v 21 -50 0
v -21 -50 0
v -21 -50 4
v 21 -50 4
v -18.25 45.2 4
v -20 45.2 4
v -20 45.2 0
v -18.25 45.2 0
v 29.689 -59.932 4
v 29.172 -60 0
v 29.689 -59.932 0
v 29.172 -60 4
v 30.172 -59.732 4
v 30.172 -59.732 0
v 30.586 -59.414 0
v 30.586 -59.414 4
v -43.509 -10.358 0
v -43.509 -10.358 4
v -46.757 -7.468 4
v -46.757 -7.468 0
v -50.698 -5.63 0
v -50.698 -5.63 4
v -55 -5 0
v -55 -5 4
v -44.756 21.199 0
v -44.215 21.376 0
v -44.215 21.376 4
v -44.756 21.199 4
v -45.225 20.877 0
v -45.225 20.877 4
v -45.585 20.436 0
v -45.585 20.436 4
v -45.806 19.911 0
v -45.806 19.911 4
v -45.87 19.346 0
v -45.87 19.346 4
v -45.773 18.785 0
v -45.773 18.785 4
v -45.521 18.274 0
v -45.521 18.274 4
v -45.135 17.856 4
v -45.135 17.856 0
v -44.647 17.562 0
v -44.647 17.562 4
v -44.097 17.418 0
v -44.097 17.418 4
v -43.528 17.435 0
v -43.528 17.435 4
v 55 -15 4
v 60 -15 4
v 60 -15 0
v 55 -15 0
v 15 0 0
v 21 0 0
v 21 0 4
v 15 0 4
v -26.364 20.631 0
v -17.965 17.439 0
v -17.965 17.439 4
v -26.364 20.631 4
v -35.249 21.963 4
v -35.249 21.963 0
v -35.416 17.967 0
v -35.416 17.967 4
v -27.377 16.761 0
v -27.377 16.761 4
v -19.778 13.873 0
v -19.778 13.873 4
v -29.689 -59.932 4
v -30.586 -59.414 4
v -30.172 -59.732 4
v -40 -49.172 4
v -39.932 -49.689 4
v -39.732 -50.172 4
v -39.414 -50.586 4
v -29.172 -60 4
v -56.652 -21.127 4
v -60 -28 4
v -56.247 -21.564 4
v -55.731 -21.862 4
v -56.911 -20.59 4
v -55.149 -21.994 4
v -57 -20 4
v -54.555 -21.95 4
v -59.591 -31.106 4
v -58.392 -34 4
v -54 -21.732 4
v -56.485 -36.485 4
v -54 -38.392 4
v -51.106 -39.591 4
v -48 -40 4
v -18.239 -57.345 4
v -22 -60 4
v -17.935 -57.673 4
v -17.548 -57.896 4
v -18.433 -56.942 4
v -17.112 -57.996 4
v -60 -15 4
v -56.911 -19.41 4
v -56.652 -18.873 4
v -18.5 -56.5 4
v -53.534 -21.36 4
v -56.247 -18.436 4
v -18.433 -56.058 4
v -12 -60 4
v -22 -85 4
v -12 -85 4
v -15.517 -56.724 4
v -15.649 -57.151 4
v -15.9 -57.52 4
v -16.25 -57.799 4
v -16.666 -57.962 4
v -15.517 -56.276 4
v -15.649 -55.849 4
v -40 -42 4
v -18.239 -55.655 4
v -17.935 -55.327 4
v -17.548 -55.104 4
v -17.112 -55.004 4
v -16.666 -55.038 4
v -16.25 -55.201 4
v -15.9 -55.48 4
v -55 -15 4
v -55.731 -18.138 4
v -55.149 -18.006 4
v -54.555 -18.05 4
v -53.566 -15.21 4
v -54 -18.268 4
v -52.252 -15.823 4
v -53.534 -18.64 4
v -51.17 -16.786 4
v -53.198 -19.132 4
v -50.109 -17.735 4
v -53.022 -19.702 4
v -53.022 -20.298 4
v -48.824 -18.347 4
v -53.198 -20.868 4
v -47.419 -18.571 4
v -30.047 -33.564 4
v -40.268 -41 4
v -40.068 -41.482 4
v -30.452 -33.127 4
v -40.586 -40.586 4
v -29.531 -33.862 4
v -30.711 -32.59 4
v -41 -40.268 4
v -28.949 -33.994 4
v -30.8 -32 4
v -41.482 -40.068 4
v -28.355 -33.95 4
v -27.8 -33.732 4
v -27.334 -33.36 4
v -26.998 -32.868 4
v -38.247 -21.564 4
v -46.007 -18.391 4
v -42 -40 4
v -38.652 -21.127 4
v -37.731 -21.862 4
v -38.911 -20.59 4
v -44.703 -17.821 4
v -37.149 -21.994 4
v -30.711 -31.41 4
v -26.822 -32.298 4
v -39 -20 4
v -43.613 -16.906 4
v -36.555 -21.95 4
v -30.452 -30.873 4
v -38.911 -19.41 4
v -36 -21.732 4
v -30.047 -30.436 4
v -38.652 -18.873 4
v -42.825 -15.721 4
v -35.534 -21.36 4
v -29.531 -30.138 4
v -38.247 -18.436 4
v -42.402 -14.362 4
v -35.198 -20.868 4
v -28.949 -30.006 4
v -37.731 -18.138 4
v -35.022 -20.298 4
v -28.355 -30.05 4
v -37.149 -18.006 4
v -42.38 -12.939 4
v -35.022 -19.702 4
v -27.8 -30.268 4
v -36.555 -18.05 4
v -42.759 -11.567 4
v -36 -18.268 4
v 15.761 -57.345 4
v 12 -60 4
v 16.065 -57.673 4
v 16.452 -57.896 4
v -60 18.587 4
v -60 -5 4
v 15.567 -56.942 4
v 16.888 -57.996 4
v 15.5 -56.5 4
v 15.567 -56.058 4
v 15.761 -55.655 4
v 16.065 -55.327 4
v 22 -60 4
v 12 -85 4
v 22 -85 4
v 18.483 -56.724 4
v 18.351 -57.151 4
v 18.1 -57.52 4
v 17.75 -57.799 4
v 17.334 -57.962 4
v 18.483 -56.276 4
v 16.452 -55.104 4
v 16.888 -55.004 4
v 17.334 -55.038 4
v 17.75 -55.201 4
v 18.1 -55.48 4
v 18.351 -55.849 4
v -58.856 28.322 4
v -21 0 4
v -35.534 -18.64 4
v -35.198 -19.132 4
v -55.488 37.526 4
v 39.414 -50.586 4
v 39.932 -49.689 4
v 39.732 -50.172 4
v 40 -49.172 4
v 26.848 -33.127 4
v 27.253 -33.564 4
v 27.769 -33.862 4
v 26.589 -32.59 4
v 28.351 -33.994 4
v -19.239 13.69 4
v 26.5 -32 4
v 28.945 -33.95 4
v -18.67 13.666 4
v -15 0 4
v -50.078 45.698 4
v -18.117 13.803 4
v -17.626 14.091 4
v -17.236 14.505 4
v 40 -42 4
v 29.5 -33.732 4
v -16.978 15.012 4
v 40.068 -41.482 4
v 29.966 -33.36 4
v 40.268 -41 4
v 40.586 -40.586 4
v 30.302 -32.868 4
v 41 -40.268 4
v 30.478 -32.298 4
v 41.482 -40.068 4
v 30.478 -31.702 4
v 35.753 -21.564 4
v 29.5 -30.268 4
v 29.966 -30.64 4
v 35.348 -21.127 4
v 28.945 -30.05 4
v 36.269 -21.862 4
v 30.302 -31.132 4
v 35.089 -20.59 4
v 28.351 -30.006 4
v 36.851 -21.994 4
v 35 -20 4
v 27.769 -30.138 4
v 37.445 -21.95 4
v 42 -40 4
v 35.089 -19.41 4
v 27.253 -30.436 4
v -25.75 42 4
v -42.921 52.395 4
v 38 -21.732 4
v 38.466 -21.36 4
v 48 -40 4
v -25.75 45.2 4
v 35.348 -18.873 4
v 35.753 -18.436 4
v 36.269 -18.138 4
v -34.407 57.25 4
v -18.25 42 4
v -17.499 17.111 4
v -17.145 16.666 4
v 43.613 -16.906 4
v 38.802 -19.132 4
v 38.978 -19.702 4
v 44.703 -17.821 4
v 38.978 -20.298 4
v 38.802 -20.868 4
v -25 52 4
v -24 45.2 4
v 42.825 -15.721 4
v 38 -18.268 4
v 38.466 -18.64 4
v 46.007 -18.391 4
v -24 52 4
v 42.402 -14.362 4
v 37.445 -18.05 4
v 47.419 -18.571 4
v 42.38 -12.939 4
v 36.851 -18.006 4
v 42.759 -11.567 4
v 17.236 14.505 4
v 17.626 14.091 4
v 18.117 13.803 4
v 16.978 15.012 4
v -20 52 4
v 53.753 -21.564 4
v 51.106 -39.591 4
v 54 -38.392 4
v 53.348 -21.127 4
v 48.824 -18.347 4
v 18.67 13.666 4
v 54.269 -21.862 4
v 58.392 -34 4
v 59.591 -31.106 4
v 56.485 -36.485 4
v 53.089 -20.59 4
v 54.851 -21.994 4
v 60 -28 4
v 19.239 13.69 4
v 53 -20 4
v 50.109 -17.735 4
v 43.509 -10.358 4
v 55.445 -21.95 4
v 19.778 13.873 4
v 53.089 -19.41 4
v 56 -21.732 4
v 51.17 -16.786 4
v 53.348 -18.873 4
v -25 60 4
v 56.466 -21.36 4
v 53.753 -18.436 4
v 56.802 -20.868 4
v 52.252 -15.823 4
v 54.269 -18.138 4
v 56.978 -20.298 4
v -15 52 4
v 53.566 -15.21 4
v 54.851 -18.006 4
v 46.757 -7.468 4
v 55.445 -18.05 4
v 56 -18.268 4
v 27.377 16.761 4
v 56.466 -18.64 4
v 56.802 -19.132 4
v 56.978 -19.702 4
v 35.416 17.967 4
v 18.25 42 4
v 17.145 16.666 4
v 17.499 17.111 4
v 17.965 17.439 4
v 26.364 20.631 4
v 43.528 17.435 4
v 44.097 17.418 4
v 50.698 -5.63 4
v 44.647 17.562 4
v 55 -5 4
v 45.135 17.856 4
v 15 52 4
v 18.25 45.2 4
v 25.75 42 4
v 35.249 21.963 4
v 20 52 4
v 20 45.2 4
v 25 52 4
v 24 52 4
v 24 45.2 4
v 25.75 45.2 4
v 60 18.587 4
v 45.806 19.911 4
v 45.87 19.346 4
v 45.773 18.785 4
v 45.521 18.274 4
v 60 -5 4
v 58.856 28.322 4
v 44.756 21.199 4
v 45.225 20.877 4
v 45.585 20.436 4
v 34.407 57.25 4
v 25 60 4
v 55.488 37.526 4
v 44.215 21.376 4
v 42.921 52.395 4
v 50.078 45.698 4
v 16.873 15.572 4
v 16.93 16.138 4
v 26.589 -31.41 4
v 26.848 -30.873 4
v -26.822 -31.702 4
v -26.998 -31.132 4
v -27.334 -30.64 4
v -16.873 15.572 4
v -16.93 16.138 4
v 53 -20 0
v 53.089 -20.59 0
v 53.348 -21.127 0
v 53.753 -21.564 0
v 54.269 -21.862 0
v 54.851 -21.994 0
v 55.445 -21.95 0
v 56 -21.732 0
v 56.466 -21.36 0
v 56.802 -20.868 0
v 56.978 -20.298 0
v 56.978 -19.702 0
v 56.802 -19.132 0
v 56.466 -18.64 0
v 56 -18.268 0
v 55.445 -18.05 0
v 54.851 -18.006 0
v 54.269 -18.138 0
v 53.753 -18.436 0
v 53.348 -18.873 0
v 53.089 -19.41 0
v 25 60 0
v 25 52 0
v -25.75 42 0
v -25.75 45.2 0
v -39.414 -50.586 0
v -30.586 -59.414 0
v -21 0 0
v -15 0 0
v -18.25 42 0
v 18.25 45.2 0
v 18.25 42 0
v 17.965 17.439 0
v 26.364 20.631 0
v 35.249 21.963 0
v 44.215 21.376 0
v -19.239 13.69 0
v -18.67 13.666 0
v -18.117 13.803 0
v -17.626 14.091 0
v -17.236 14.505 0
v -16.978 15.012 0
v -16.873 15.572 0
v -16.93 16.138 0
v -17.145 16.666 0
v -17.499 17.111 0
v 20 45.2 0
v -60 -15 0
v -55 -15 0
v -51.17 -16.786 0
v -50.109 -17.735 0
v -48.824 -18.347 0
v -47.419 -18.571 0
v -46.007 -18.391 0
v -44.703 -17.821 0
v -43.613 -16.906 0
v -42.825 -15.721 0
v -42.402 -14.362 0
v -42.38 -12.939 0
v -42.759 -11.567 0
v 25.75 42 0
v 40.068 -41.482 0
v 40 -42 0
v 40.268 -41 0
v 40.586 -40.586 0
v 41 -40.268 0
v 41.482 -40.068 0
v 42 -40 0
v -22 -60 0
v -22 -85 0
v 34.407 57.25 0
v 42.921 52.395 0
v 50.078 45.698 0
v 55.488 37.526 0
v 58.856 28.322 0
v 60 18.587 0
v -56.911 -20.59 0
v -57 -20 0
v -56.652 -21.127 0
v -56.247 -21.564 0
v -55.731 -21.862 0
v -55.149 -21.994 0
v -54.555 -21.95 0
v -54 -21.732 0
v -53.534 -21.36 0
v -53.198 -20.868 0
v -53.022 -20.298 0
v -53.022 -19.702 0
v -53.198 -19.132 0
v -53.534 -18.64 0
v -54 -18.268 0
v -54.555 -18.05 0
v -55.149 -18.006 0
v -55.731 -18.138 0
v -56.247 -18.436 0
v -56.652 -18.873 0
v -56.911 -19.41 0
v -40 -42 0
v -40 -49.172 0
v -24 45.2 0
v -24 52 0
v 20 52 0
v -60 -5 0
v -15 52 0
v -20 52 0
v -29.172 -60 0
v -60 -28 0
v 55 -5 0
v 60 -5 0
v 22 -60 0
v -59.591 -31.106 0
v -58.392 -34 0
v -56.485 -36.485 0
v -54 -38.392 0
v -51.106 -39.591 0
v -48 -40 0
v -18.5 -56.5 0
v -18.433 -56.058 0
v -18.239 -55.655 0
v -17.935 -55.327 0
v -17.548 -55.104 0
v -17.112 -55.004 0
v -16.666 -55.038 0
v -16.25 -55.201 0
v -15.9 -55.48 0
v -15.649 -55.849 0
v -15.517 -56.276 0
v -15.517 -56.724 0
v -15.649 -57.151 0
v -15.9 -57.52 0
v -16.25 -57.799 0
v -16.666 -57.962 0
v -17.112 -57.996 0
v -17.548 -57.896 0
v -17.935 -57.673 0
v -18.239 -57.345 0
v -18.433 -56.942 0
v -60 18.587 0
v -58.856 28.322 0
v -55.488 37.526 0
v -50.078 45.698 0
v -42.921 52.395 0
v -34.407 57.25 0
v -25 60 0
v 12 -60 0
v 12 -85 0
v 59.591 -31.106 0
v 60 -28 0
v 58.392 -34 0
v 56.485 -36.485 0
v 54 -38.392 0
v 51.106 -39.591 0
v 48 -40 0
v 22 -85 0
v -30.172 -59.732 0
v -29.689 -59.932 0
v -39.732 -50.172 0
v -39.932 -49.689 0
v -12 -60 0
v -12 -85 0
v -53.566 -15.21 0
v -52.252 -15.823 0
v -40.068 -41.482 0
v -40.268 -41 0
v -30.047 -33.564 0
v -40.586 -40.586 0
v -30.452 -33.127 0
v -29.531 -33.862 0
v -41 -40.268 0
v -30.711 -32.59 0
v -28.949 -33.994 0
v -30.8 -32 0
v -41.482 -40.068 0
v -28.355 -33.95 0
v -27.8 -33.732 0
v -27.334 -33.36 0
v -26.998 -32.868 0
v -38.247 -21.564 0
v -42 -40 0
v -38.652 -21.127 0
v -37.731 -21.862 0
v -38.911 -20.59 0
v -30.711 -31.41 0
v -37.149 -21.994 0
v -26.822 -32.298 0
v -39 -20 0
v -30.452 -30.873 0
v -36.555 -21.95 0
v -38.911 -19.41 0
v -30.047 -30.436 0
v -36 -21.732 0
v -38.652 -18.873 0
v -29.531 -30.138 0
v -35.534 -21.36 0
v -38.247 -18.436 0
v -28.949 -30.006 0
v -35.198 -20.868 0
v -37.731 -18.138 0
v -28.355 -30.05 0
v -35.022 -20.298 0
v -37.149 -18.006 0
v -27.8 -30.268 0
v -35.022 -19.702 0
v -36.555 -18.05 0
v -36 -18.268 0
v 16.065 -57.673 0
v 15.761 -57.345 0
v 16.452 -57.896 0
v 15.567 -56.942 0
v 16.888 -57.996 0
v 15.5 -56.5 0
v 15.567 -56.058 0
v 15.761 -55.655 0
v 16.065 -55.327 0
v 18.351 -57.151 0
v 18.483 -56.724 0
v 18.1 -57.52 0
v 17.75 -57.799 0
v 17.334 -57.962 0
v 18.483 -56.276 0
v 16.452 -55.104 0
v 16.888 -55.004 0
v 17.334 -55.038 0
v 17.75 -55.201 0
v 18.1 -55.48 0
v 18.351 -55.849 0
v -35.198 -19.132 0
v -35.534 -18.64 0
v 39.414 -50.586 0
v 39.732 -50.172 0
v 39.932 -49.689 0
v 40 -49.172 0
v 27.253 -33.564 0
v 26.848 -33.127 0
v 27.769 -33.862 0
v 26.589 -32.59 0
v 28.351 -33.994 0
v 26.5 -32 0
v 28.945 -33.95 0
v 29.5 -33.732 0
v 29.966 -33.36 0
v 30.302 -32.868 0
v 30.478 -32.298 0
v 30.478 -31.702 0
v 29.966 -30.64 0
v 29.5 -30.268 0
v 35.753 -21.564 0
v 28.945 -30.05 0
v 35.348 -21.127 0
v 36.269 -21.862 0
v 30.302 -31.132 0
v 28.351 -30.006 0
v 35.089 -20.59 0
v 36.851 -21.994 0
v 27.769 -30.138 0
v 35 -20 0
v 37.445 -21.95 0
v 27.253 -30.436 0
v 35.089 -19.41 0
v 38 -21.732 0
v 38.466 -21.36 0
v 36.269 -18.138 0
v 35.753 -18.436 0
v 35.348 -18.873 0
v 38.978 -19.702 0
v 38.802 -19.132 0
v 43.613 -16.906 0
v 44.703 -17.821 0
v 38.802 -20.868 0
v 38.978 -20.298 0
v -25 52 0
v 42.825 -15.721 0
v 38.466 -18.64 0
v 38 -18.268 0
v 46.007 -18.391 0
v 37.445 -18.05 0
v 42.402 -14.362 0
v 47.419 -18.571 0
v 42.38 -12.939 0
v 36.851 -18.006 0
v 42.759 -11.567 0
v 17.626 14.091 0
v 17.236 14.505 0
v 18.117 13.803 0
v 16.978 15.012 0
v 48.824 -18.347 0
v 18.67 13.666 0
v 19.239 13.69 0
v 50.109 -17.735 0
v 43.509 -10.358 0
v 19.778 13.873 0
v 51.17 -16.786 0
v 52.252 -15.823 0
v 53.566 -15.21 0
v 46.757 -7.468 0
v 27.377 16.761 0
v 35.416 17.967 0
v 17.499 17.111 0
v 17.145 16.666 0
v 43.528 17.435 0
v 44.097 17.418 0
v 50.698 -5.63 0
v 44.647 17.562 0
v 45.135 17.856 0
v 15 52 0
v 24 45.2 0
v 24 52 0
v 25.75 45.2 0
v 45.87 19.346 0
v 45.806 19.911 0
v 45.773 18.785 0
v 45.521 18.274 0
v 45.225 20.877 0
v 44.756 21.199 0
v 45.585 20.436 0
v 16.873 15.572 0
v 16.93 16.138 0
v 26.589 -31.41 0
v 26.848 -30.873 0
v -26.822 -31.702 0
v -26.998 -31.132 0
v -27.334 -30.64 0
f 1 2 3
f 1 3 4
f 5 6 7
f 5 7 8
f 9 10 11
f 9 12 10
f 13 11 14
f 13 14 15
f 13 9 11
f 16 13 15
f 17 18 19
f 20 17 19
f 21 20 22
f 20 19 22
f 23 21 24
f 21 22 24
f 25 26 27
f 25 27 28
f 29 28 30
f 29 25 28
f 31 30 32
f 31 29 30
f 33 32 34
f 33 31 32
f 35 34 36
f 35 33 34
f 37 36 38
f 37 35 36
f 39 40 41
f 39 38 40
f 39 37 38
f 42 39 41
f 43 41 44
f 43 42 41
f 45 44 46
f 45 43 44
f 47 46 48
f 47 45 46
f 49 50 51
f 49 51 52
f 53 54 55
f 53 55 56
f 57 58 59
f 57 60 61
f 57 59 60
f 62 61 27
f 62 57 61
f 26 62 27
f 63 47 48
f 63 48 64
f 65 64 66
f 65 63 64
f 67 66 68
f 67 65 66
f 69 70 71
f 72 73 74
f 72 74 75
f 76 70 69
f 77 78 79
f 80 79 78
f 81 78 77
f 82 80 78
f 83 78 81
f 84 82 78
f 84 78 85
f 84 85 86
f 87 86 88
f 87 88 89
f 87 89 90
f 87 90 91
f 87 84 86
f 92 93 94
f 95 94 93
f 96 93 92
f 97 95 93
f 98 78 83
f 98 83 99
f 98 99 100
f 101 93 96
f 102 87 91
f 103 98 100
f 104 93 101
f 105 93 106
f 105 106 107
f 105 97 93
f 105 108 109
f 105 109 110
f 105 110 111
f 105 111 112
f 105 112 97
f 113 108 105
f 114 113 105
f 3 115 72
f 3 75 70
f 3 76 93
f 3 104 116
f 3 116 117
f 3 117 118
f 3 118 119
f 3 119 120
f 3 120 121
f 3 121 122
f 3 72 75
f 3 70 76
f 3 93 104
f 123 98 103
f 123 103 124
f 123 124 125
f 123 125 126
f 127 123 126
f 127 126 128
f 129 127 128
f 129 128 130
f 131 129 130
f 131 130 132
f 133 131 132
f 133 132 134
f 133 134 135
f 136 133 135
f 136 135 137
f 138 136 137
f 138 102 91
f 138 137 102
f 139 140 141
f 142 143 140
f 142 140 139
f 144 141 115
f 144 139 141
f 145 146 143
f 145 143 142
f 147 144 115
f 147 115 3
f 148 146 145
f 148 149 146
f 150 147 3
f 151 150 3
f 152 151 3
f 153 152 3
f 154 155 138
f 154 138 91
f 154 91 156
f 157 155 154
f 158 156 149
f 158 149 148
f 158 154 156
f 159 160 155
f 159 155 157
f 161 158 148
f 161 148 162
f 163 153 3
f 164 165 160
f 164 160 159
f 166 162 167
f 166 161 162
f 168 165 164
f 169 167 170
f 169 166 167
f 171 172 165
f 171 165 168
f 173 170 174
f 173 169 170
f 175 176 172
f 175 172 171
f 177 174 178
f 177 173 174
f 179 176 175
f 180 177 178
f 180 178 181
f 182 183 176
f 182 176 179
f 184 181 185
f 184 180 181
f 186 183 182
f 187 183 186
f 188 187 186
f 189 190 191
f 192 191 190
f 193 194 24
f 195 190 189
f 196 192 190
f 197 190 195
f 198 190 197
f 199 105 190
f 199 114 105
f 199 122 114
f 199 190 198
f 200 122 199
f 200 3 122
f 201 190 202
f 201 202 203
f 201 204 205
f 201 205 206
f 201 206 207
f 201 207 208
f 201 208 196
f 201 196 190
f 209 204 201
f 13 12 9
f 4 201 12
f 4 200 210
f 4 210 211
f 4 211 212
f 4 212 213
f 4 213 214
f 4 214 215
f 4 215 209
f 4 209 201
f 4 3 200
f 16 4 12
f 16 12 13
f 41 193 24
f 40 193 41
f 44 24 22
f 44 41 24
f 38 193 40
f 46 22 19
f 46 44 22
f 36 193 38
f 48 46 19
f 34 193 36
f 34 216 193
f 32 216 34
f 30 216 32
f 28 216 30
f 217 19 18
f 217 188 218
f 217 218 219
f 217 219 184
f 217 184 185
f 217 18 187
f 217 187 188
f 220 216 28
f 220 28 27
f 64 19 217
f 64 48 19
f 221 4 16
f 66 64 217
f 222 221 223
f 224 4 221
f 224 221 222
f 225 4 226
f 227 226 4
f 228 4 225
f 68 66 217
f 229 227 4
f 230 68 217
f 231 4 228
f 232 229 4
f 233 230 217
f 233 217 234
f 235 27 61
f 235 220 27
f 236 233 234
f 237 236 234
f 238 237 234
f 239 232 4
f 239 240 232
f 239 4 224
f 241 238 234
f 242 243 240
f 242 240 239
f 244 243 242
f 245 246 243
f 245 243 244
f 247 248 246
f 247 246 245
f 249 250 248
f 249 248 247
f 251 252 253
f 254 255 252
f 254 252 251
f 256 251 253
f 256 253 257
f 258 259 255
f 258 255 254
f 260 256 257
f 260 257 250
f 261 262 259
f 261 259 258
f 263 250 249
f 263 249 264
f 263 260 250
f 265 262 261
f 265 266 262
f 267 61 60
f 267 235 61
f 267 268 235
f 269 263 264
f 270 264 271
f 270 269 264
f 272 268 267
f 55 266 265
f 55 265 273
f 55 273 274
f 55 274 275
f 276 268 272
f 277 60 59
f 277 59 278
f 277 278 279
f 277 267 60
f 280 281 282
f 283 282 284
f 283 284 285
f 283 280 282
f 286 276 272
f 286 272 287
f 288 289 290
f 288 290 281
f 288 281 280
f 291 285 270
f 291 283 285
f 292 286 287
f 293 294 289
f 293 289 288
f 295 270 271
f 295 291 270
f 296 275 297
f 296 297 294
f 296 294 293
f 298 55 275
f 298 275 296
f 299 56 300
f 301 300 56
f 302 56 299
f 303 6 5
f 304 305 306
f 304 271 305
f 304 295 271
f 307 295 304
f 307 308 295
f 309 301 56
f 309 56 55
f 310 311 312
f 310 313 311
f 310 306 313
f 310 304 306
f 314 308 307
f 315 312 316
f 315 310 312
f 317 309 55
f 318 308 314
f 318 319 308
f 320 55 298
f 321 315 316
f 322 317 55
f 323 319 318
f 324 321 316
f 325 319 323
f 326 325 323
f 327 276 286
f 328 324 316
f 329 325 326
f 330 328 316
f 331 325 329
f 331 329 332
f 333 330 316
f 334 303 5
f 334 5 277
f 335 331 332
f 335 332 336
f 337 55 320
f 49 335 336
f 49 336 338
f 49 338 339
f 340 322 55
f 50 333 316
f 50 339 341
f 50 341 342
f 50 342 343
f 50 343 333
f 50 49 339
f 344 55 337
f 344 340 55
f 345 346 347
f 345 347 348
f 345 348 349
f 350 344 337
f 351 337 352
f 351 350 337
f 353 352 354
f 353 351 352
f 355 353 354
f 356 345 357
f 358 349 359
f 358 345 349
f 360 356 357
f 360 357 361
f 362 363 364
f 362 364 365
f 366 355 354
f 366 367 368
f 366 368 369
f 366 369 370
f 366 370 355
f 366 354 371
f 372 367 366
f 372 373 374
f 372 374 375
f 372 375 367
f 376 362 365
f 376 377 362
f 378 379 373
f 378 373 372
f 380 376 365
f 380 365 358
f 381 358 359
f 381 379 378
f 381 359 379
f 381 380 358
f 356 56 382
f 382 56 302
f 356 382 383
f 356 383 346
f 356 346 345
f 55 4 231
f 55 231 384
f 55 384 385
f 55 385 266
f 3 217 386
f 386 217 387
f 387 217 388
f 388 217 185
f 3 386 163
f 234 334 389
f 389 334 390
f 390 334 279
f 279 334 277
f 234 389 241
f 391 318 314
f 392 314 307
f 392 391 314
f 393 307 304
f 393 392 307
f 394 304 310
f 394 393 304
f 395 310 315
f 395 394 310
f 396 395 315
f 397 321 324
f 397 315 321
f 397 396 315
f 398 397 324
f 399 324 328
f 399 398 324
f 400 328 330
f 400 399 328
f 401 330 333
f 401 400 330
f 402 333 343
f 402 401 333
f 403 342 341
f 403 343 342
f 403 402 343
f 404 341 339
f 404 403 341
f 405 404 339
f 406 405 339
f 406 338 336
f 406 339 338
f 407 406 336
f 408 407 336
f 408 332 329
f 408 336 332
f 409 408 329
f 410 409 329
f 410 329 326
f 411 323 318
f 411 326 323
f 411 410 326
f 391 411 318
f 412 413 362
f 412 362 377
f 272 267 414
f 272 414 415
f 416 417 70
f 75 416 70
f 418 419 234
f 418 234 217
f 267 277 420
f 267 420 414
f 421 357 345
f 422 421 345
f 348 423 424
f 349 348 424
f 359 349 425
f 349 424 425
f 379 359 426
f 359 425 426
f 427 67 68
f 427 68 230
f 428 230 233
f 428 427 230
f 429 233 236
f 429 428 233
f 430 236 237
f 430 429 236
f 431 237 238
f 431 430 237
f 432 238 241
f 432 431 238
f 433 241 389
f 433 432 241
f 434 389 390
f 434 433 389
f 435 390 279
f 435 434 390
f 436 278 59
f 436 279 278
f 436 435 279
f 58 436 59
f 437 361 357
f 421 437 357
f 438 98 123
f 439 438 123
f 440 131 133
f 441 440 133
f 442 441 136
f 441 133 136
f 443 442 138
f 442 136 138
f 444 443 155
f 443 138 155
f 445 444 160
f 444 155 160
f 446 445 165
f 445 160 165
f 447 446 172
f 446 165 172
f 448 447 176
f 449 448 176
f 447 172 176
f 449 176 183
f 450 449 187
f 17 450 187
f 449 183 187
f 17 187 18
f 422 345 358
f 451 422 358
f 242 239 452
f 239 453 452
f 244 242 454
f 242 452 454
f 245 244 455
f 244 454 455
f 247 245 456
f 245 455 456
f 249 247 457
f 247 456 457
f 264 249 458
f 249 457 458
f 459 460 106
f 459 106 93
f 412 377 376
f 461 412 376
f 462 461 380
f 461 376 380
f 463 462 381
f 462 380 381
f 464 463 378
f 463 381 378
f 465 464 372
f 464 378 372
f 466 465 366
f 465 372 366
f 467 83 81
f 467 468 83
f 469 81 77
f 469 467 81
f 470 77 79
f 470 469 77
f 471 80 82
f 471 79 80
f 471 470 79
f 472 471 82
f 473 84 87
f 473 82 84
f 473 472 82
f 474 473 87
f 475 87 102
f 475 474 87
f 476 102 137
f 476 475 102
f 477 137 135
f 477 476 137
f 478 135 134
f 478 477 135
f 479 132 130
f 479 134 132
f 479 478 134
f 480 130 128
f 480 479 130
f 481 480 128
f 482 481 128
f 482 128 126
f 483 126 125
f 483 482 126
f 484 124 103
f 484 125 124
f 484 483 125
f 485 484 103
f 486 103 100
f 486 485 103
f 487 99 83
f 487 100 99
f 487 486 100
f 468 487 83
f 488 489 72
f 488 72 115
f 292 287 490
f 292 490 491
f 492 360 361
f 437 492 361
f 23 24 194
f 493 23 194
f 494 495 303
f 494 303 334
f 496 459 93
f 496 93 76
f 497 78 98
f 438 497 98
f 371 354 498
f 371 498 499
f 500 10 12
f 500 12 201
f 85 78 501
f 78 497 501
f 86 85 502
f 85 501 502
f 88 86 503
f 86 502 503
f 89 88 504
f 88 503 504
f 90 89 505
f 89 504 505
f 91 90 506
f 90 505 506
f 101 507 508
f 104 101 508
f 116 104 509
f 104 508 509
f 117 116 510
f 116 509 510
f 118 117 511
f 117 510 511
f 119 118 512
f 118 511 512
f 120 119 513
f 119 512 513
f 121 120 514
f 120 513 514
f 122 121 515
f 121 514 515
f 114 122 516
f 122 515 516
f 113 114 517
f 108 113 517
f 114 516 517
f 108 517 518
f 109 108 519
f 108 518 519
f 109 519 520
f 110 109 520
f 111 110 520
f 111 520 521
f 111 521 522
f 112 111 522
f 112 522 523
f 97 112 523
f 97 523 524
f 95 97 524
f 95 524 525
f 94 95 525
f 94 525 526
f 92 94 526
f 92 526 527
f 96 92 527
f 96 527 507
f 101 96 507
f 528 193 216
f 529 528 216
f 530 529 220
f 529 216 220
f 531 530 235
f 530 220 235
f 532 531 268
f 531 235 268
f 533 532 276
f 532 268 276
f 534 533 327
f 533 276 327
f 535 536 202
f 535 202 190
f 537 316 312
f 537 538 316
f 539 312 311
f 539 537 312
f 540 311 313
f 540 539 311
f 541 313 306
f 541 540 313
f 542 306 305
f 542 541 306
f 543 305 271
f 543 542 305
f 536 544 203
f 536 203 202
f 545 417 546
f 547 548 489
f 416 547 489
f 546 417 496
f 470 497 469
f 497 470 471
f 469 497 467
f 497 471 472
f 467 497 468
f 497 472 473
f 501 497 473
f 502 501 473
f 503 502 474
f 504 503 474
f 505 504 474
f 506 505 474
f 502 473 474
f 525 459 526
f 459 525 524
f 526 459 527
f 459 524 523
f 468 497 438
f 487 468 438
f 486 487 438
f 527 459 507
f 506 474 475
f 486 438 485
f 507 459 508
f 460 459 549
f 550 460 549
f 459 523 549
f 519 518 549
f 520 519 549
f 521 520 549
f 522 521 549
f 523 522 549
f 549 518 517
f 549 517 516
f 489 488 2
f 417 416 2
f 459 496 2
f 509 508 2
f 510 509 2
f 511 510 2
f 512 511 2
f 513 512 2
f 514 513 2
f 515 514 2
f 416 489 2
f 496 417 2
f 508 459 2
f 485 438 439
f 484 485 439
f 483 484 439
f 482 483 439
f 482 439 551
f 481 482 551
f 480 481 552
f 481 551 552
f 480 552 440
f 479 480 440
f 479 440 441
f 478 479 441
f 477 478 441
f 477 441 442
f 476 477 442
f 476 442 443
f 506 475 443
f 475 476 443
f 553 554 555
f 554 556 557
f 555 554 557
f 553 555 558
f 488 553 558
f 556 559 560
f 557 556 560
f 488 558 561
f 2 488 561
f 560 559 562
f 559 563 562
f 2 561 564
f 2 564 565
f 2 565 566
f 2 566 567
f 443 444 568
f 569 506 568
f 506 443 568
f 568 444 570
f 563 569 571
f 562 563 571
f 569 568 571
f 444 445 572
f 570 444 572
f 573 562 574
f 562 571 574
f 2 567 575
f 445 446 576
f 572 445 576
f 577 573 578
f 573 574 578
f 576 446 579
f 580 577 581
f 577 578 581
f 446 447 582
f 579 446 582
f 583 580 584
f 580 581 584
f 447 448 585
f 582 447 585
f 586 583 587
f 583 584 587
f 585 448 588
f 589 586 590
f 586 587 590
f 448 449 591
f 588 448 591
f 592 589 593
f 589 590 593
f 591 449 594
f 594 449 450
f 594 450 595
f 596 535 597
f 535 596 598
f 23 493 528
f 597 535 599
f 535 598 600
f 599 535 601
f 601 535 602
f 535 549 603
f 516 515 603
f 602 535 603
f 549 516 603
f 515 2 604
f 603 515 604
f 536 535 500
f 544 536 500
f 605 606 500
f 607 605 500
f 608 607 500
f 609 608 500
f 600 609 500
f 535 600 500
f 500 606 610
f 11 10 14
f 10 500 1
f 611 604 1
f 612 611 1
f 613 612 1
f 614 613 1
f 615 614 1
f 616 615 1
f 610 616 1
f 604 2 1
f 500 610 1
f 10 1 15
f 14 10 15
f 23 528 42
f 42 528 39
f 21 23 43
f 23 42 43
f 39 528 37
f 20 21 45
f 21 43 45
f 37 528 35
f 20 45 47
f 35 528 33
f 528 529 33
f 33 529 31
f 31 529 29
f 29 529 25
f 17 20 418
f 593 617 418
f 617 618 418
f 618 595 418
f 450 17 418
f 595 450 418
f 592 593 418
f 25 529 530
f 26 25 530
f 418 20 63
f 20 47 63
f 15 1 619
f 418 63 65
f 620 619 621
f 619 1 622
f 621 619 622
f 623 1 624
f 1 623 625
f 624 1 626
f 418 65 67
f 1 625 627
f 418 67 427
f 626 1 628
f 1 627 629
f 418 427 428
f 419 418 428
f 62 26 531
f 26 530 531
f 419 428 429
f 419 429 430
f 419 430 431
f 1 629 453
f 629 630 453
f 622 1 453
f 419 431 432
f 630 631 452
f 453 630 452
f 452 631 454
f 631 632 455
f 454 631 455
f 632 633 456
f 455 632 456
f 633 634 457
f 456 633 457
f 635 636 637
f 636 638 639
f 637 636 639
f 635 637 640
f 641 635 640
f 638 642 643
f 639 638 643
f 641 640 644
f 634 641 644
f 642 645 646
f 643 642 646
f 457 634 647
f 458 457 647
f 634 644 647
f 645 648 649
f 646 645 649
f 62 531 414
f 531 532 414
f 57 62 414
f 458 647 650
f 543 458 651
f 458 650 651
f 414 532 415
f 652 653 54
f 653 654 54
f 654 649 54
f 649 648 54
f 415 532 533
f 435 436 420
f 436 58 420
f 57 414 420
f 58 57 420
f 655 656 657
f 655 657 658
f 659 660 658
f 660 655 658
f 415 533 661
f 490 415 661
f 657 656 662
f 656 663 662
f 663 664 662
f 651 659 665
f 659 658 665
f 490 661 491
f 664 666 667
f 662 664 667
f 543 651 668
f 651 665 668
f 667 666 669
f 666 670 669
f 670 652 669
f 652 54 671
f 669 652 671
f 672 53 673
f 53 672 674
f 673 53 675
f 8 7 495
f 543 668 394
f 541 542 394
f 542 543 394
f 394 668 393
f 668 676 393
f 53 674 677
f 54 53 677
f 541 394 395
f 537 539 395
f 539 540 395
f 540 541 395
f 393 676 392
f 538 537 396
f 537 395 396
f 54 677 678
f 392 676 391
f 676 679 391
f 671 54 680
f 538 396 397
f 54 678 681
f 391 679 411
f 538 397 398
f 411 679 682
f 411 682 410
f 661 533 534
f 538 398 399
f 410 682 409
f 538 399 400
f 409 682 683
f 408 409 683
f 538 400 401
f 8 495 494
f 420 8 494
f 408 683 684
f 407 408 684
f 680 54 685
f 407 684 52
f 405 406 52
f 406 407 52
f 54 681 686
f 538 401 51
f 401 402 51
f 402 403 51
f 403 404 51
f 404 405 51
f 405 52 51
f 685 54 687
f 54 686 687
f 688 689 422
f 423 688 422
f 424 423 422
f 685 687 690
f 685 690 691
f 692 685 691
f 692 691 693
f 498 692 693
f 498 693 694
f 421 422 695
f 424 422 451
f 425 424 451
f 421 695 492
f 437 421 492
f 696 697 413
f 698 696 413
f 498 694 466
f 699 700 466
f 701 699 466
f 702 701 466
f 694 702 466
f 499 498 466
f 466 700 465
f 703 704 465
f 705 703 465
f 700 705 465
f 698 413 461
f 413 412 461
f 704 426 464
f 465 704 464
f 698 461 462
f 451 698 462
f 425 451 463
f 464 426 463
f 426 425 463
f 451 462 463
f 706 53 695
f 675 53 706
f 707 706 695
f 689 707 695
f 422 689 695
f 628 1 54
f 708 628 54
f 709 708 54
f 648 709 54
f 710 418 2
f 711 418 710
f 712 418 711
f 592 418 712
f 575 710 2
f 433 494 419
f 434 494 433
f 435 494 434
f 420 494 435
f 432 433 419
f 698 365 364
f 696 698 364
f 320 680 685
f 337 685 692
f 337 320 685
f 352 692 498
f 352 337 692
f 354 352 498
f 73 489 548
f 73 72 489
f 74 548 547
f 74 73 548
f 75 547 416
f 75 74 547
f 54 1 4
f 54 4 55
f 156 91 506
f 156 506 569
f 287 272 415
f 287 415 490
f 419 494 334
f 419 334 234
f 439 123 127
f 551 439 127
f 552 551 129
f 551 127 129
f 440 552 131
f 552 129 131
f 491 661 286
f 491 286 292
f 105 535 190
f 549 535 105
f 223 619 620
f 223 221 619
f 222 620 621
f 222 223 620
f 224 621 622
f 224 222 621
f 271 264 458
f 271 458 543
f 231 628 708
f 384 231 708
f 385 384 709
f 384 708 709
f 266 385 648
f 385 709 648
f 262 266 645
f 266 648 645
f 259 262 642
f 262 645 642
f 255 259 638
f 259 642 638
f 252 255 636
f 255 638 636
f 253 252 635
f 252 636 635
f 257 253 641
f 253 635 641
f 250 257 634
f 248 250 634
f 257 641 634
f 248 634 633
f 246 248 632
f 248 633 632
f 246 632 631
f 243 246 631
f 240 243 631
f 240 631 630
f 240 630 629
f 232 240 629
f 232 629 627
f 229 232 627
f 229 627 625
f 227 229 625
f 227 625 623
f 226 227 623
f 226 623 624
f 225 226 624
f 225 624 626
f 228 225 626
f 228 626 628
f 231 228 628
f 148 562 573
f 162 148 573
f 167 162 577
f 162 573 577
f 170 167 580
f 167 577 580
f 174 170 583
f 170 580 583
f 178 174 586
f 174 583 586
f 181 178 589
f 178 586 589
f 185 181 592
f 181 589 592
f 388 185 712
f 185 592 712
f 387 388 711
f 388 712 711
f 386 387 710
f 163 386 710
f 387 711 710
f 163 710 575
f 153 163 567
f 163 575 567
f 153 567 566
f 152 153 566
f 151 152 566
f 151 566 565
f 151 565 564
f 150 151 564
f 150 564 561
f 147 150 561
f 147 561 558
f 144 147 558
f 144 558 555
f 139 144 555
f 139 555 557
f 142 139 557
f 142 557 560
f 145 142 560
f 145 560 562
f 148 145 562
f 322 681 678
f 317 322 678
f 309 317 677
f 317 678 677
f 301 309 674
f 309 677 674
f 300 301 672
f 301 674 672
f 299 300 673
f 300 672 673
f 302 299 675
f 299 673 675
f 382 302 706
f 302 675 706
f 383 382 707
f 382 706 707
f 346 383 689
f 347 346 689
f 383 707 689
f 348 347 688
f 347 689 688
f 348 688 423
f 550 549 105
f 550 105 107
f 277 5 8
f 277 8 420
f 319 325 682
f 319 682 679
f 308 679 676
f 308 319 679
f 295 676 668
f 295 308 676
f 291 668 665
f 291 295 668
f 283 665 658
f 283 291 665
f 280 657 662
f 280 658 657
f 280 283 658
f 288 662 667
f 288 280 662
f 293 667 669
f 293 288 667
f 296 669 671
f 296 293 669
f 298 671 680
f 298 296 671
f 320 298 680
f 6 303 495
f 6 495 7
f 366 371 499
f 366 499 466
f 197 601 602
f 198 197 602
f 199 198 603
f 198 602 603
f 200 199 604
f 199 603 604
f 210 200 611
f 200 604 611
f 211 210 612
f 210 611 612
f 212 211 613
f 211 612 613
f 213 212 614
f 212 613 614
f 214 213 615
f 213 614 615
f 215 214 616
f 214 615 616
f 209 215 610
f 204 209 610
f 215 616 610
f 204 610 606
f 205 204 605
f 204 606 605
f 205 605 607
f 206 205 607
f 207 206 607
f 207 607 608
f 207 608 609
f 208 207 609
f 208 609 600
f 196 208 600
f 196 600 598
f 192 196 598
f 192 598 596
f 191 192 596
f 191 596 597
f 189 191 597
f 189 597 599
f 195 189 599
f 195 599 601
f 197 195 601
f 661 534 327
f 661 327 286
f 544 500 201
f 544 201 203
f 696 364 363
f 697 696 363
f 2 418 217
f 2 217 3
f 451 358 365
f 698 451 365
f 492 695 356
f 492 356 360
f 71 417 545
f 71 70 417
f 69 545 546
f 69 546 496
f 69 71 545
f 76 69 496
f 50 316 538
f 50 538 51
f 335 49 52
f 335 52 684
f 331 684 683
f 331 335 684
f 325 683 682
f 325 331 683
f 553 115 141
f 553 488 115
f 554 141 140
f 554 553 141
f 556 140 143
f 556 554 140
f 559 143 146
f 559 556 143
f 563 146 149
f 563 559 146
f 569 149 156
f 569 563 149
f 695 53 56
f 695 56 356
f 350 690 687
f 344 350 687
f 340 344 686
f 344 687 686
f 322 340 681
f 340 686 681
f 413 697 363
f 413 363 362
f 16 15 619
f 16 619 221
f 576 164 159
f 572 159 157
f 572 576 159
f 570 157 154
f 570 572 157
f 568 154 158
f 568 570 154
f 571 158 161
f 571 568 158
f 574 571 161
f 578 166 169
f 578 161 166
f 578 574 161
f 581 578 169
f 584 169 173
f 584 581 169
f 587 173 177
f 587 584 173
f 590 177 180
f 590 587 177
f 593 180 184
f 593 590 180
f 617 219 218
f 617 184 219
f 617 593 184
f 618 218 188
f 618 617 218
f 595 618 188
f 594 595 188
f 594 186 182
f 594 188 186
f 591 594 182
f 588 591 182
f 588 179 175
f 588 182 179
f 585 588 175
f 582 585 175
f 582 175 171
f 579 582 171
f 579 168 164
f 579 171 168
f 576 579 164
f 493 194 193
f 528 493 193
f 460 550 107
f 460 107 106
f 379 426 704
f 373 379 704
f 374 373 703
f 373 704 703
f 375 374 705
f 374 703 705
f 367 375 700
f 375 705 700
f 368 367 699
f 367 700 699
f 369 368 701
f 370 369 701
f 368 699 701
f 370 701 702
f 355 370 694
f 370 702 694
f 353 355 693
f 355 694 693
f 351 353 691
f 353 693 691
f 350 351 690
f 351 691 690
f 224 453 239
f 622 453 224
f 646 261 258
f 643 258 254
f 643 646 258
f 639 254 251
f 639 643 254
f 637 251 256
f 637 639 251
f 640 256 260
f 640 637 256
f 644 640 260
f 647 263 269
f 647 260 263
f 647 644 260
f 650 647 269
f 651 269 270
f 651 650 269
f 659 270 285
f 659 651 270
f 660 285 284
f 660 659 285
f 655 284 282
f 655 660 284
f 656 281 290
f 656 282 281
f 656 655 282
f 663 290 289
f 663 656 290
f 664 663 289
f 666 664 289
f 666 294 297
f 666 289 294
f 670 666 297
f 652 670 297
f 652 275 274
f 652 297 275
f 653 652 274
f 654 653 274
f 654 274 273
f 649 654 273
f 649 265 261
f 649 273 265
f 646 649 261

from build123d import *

# Parameters (mm, degrees)
BOSS_EXTRUDE1_DEPTH = 4
SKETCH2_R           = 2
SKETCH2_R_2         = 1.5
CUT_EXTRUDE1_DEPTH  = 95.026591983
SKETCH4_W           = 20
SKETCH4_H           = 100
BOSS_EXTRUDE2_DEPTH = 4
FILLET3_R           = 42
FILLET4_R           = 12
SKETCH7_R           = 2
CUT_EXTRUDE3_DEPTH  = 105.120122935
CHAMFER1_SIZE       = 10
FILLET8_R           = 2
CUT_EXTRUDE4_DEPTH  = 105.120122935
CUT_EXTRUDE5_DEPTH  = 105.120122935
SKETCH10_R          = 2
CUT_EXTRUDE6_DEPTH  = 105.120122935


with BuildPart() as part:
    # Sketch1 → Boss-Extrude1 (new body)
    with BuildSketch(Plane.XY):
        Polygon((-40, 60), (-25, 60), (-25, 52), (-15, 52), (-15, 0), (-21, 0), (-21, -50), (21, -50), (21, 0), (15, 0), (15, 52), (25, 52), (25, 60), (40, 60), (40, -60), (22, -60), (22, -85), (12, -85), (12, -60), (-12, -60), (-12, -85), (-22, -85), (-22, -60), (-40, -60), align=None)
    extrude(amount=BOSS_EXTRUDE1_DEPTH)

    # Sketch2 → Cut-Extrude1 (cut, through all)
    with BuildSketch(Plane(origin=(0, 0, 0), x_dir=(-1, 0, 0), z_dir=(0, 0, -1))):
        with Locations((-28.5, -32)):
            Circle(SKETCH2_R)
        with Locations((17, -56.5)):
            Circle(SKETCH2_R_2)
        with Locations((28.8, -32)):
            Circle(SKETCH2_R)
        with Locations((-17, -56.5)):
            Circle(SKETCH2_R_2)
    extrude(amount=-CUT_EXTRUDE1_DEPTH, mode=Mode.SUBTRACT)

    # Sketch4 → Boss-Extrude2 (add)
    with BuildSketch(Plane.XY.offset(4)):
        with Locations((-50, 10)):
            Rectangle(SKETCH4_W, SKETCH4_H)
        with Locations((50, 10)):
            Rectangle(SKETCH4_W, SKETCH4_H)
    extrude(amount=-BOSS_EXTRUDE2_DEPTH)

    # Fillet3
    # the kernel refuses this fillet: 42 mm, written as the material it takes off along each edge
    with BuildSketch(Plane(origin=(60, 60, 107.531396204), x_dir=(0, -1, 0), z_dir=(0, 0, -1))) as fillet3_piece_1:
        with BuildLine():
            CenterArc((41.412558482, 42), FILLET3_R, 189.594068227, 80.405931773)
            Line((0, 35), (-0.82825117, 34.86))
            ThreePointArc((-0.82825117, 34.86), (-0.84, 17.5), (-0.84, 0))
            Line((-0.84, 0), (0, -0.84))
            Line((0, -0.84), (41.412558482, -0.84))
            Line((41.412558482, -0.84), (41.412558482, 0))
        make_face()
    extrude(amount=211.062792409, mode=Mode.SUBTRACT)
    with BuildSketch(Plane(origin=(-60, 60, 107.531396204), x_dir=(1, 0, 0), z_dir=(0, 0, -1))) as fillet3_piece_2:
        with BuildLine():
            CenterArc((42, 41.412558482), FILLET3_R, 180, 80.405931773)
            Line((0, 41.412558482), (-0.84, 41.412558482))
            Line((-0.84, 41.412558482), (-0.84, 0))
            Line((-0.84, 0), (0, -0.84))
            ThreePointArc((0, -0.84), (17.5, -0.84), (34.86, -0.82825117))
            Line((34.86, -0.82825117), (35, 0))
        make_face()
    extrude(amount=211.062792409, mode=Mode.SUBTRACT)

    # Fillet4
    fillet4_edges = [part.edges().sort_by_distance(p)[0] for p in [
        (60, -40, 2),
        (-60, -40, 2),
    ]]
    fillet(fillet4_edges, radius=FILLET4_R)

    # Sketch7 → Cut-Extrude3 (cut, through all)
    with BuildSketch(Plane.XY):
        with Locations(Location((-55, -20, 0), (0, 0, 180))):
            Circle(SKETCH7_R)
        with Locations(Location((55, -20, 0), (0, 0, 180))):
            Circle(SKETCH7_R)
        with Locations(Location((-37, -20, 0), (0, 0, 180))):
            Circle(SKETCH7_R)
        with Locations(Location((37, -20, 0), (0, 0, 180))):
            Circle(SKETCH7_R)
    extrude(amount=CUT_EXTRUDE3_DEPTH, mode=Mode.SUBTRACT)

    # Chamfer1
    chamfer1_edges = [part.edges().sort_by_distance(p)[0] for p in [
        (-40, -60, 2),
        (40, -60, 2),
    ]]
    chamfer(chamfer1_edges, length=CHAMFER1_SIZE)

    # Fillet8
    fillet8_edges = [part.edges().sort_by_distance(p)[0] for p in [
        (-30, -60, 2),
        (-40, -50, 2),
        (30, -60, 2),
        (40, -50, 2),
        (40, -40, 2),
        (-40, -40, 2),
    ]]
    fillet(fillet8_edges, radius=FILLET8_R)

    # Sketch8 → Cut-Extrude4 (cut, through all)
    with BuildSketch(Plane(origin=(0, 0, 0), x_dir=(-1, 0, 0), z_dir=(0, 0, -1))):
        with BuildLine():
            ThreePointArc((-17.964817996, 17.438774634), (-30.770630407, 21.535466224), (-44.214817996, 21.375674028))
            ThreePointArc((-44.214817996, 21.375674028), (-45.841525426, 19.061841075), (-43.527692473, 17.435133644))
            ThreePointArc((-43.527692473, 17.435133644), (-31.363903701, 17.579707536), (-19.777692473, 13.87317705))
            ThreePointArc((-19.777692473, 13.87317705), (-17.088456442, 14.749538603), (-17.964817996, 17.438774634))
        make_face()
        with BuildLine():
            ThreePointArc((17.964817996, 17.438774634), (30.770630407, 21.535466224), (44.214817996, 21.375674028))
            ThreePointArc((44.214817996, 21.375674028), (45.841525426, 19.061841075), (43.527692473, 17.435133644))
            ThreePointArc((43.527692473, 17.435133644), (31.363903701, 17.579707536), (19.777692473, 13.87317705))
            ThreePointArc((19.777692473, 13.87317705), (17.088456442, 14.749538603), (17.964817996, 17.438774634))
        make_face()
    extrude(amount=-CUT_EXTRUDE4_DEPTH, mode=Mode.SUBTRACT)

    # Sketch9 → Cut-Extrude5 (cut, through all)
    with BuildSketch(Plane.XY.offset(4)):
        Polygon((-24, 52), (-20, 52), (-20, 45.2), (-18.25, 45.2), (-18.25, 42), (-25.75, 42), (-25.75, 45.2), (-24, 45.2), align=None)
    cut_extrude5 = extrude(amount=-CUT_EXTRUDE5_DEPTH, mode=Mode.SUBTRACT)

    # Mirror1: Cut-Extrude5 across plane
    add(cut_extrude5.mirror(Plane(origin=(0, 0, 0), x_dir=(0, 0, 1), z_dir=(1, 0, 0))), mode=Mode.SUBTRACT)

    # Sketch10 → Cut-Extrude6 (cut, through all)
    with BuildSketch(Plane.XY.offset(4)):
        with Locations(Location((55, -20, 0), (0, 0, 180))):
            Circle(SKETCH10_R)
        with BuildLine():
            Line((55, -5), (60, -5))
            Line((60, -5), (60, -15))
            Line((60, -15), (55, -15))
            ThreePointArc((55, -15), (52.886908691, -15.468461065), (51.169777784, -16.786061952))
            ThreePointArc((51.169777784, -16.786061952), (44.12561752, -17.402346119), (43.509333353, -10.358185855))
            ThreePointArc((43.509333353, -10.358185855), (48.660726074, -6.405383194), (55, -5))
        make_face()
    cut_extrude6 = extrude(amount=-CUT_EXTRUDE6_DEPTH, mode=Mode.SUBTRACT)

    # Mirror2: Cut-Extrude6 across plane
    add(cut_extrude6.mirror(Plane(origin=(0, 0, 0), x_dir=(0, 0, 1), z_dir=(1, 0, 0))), mode=Mode.SUBTRACT)


solid = part.part
